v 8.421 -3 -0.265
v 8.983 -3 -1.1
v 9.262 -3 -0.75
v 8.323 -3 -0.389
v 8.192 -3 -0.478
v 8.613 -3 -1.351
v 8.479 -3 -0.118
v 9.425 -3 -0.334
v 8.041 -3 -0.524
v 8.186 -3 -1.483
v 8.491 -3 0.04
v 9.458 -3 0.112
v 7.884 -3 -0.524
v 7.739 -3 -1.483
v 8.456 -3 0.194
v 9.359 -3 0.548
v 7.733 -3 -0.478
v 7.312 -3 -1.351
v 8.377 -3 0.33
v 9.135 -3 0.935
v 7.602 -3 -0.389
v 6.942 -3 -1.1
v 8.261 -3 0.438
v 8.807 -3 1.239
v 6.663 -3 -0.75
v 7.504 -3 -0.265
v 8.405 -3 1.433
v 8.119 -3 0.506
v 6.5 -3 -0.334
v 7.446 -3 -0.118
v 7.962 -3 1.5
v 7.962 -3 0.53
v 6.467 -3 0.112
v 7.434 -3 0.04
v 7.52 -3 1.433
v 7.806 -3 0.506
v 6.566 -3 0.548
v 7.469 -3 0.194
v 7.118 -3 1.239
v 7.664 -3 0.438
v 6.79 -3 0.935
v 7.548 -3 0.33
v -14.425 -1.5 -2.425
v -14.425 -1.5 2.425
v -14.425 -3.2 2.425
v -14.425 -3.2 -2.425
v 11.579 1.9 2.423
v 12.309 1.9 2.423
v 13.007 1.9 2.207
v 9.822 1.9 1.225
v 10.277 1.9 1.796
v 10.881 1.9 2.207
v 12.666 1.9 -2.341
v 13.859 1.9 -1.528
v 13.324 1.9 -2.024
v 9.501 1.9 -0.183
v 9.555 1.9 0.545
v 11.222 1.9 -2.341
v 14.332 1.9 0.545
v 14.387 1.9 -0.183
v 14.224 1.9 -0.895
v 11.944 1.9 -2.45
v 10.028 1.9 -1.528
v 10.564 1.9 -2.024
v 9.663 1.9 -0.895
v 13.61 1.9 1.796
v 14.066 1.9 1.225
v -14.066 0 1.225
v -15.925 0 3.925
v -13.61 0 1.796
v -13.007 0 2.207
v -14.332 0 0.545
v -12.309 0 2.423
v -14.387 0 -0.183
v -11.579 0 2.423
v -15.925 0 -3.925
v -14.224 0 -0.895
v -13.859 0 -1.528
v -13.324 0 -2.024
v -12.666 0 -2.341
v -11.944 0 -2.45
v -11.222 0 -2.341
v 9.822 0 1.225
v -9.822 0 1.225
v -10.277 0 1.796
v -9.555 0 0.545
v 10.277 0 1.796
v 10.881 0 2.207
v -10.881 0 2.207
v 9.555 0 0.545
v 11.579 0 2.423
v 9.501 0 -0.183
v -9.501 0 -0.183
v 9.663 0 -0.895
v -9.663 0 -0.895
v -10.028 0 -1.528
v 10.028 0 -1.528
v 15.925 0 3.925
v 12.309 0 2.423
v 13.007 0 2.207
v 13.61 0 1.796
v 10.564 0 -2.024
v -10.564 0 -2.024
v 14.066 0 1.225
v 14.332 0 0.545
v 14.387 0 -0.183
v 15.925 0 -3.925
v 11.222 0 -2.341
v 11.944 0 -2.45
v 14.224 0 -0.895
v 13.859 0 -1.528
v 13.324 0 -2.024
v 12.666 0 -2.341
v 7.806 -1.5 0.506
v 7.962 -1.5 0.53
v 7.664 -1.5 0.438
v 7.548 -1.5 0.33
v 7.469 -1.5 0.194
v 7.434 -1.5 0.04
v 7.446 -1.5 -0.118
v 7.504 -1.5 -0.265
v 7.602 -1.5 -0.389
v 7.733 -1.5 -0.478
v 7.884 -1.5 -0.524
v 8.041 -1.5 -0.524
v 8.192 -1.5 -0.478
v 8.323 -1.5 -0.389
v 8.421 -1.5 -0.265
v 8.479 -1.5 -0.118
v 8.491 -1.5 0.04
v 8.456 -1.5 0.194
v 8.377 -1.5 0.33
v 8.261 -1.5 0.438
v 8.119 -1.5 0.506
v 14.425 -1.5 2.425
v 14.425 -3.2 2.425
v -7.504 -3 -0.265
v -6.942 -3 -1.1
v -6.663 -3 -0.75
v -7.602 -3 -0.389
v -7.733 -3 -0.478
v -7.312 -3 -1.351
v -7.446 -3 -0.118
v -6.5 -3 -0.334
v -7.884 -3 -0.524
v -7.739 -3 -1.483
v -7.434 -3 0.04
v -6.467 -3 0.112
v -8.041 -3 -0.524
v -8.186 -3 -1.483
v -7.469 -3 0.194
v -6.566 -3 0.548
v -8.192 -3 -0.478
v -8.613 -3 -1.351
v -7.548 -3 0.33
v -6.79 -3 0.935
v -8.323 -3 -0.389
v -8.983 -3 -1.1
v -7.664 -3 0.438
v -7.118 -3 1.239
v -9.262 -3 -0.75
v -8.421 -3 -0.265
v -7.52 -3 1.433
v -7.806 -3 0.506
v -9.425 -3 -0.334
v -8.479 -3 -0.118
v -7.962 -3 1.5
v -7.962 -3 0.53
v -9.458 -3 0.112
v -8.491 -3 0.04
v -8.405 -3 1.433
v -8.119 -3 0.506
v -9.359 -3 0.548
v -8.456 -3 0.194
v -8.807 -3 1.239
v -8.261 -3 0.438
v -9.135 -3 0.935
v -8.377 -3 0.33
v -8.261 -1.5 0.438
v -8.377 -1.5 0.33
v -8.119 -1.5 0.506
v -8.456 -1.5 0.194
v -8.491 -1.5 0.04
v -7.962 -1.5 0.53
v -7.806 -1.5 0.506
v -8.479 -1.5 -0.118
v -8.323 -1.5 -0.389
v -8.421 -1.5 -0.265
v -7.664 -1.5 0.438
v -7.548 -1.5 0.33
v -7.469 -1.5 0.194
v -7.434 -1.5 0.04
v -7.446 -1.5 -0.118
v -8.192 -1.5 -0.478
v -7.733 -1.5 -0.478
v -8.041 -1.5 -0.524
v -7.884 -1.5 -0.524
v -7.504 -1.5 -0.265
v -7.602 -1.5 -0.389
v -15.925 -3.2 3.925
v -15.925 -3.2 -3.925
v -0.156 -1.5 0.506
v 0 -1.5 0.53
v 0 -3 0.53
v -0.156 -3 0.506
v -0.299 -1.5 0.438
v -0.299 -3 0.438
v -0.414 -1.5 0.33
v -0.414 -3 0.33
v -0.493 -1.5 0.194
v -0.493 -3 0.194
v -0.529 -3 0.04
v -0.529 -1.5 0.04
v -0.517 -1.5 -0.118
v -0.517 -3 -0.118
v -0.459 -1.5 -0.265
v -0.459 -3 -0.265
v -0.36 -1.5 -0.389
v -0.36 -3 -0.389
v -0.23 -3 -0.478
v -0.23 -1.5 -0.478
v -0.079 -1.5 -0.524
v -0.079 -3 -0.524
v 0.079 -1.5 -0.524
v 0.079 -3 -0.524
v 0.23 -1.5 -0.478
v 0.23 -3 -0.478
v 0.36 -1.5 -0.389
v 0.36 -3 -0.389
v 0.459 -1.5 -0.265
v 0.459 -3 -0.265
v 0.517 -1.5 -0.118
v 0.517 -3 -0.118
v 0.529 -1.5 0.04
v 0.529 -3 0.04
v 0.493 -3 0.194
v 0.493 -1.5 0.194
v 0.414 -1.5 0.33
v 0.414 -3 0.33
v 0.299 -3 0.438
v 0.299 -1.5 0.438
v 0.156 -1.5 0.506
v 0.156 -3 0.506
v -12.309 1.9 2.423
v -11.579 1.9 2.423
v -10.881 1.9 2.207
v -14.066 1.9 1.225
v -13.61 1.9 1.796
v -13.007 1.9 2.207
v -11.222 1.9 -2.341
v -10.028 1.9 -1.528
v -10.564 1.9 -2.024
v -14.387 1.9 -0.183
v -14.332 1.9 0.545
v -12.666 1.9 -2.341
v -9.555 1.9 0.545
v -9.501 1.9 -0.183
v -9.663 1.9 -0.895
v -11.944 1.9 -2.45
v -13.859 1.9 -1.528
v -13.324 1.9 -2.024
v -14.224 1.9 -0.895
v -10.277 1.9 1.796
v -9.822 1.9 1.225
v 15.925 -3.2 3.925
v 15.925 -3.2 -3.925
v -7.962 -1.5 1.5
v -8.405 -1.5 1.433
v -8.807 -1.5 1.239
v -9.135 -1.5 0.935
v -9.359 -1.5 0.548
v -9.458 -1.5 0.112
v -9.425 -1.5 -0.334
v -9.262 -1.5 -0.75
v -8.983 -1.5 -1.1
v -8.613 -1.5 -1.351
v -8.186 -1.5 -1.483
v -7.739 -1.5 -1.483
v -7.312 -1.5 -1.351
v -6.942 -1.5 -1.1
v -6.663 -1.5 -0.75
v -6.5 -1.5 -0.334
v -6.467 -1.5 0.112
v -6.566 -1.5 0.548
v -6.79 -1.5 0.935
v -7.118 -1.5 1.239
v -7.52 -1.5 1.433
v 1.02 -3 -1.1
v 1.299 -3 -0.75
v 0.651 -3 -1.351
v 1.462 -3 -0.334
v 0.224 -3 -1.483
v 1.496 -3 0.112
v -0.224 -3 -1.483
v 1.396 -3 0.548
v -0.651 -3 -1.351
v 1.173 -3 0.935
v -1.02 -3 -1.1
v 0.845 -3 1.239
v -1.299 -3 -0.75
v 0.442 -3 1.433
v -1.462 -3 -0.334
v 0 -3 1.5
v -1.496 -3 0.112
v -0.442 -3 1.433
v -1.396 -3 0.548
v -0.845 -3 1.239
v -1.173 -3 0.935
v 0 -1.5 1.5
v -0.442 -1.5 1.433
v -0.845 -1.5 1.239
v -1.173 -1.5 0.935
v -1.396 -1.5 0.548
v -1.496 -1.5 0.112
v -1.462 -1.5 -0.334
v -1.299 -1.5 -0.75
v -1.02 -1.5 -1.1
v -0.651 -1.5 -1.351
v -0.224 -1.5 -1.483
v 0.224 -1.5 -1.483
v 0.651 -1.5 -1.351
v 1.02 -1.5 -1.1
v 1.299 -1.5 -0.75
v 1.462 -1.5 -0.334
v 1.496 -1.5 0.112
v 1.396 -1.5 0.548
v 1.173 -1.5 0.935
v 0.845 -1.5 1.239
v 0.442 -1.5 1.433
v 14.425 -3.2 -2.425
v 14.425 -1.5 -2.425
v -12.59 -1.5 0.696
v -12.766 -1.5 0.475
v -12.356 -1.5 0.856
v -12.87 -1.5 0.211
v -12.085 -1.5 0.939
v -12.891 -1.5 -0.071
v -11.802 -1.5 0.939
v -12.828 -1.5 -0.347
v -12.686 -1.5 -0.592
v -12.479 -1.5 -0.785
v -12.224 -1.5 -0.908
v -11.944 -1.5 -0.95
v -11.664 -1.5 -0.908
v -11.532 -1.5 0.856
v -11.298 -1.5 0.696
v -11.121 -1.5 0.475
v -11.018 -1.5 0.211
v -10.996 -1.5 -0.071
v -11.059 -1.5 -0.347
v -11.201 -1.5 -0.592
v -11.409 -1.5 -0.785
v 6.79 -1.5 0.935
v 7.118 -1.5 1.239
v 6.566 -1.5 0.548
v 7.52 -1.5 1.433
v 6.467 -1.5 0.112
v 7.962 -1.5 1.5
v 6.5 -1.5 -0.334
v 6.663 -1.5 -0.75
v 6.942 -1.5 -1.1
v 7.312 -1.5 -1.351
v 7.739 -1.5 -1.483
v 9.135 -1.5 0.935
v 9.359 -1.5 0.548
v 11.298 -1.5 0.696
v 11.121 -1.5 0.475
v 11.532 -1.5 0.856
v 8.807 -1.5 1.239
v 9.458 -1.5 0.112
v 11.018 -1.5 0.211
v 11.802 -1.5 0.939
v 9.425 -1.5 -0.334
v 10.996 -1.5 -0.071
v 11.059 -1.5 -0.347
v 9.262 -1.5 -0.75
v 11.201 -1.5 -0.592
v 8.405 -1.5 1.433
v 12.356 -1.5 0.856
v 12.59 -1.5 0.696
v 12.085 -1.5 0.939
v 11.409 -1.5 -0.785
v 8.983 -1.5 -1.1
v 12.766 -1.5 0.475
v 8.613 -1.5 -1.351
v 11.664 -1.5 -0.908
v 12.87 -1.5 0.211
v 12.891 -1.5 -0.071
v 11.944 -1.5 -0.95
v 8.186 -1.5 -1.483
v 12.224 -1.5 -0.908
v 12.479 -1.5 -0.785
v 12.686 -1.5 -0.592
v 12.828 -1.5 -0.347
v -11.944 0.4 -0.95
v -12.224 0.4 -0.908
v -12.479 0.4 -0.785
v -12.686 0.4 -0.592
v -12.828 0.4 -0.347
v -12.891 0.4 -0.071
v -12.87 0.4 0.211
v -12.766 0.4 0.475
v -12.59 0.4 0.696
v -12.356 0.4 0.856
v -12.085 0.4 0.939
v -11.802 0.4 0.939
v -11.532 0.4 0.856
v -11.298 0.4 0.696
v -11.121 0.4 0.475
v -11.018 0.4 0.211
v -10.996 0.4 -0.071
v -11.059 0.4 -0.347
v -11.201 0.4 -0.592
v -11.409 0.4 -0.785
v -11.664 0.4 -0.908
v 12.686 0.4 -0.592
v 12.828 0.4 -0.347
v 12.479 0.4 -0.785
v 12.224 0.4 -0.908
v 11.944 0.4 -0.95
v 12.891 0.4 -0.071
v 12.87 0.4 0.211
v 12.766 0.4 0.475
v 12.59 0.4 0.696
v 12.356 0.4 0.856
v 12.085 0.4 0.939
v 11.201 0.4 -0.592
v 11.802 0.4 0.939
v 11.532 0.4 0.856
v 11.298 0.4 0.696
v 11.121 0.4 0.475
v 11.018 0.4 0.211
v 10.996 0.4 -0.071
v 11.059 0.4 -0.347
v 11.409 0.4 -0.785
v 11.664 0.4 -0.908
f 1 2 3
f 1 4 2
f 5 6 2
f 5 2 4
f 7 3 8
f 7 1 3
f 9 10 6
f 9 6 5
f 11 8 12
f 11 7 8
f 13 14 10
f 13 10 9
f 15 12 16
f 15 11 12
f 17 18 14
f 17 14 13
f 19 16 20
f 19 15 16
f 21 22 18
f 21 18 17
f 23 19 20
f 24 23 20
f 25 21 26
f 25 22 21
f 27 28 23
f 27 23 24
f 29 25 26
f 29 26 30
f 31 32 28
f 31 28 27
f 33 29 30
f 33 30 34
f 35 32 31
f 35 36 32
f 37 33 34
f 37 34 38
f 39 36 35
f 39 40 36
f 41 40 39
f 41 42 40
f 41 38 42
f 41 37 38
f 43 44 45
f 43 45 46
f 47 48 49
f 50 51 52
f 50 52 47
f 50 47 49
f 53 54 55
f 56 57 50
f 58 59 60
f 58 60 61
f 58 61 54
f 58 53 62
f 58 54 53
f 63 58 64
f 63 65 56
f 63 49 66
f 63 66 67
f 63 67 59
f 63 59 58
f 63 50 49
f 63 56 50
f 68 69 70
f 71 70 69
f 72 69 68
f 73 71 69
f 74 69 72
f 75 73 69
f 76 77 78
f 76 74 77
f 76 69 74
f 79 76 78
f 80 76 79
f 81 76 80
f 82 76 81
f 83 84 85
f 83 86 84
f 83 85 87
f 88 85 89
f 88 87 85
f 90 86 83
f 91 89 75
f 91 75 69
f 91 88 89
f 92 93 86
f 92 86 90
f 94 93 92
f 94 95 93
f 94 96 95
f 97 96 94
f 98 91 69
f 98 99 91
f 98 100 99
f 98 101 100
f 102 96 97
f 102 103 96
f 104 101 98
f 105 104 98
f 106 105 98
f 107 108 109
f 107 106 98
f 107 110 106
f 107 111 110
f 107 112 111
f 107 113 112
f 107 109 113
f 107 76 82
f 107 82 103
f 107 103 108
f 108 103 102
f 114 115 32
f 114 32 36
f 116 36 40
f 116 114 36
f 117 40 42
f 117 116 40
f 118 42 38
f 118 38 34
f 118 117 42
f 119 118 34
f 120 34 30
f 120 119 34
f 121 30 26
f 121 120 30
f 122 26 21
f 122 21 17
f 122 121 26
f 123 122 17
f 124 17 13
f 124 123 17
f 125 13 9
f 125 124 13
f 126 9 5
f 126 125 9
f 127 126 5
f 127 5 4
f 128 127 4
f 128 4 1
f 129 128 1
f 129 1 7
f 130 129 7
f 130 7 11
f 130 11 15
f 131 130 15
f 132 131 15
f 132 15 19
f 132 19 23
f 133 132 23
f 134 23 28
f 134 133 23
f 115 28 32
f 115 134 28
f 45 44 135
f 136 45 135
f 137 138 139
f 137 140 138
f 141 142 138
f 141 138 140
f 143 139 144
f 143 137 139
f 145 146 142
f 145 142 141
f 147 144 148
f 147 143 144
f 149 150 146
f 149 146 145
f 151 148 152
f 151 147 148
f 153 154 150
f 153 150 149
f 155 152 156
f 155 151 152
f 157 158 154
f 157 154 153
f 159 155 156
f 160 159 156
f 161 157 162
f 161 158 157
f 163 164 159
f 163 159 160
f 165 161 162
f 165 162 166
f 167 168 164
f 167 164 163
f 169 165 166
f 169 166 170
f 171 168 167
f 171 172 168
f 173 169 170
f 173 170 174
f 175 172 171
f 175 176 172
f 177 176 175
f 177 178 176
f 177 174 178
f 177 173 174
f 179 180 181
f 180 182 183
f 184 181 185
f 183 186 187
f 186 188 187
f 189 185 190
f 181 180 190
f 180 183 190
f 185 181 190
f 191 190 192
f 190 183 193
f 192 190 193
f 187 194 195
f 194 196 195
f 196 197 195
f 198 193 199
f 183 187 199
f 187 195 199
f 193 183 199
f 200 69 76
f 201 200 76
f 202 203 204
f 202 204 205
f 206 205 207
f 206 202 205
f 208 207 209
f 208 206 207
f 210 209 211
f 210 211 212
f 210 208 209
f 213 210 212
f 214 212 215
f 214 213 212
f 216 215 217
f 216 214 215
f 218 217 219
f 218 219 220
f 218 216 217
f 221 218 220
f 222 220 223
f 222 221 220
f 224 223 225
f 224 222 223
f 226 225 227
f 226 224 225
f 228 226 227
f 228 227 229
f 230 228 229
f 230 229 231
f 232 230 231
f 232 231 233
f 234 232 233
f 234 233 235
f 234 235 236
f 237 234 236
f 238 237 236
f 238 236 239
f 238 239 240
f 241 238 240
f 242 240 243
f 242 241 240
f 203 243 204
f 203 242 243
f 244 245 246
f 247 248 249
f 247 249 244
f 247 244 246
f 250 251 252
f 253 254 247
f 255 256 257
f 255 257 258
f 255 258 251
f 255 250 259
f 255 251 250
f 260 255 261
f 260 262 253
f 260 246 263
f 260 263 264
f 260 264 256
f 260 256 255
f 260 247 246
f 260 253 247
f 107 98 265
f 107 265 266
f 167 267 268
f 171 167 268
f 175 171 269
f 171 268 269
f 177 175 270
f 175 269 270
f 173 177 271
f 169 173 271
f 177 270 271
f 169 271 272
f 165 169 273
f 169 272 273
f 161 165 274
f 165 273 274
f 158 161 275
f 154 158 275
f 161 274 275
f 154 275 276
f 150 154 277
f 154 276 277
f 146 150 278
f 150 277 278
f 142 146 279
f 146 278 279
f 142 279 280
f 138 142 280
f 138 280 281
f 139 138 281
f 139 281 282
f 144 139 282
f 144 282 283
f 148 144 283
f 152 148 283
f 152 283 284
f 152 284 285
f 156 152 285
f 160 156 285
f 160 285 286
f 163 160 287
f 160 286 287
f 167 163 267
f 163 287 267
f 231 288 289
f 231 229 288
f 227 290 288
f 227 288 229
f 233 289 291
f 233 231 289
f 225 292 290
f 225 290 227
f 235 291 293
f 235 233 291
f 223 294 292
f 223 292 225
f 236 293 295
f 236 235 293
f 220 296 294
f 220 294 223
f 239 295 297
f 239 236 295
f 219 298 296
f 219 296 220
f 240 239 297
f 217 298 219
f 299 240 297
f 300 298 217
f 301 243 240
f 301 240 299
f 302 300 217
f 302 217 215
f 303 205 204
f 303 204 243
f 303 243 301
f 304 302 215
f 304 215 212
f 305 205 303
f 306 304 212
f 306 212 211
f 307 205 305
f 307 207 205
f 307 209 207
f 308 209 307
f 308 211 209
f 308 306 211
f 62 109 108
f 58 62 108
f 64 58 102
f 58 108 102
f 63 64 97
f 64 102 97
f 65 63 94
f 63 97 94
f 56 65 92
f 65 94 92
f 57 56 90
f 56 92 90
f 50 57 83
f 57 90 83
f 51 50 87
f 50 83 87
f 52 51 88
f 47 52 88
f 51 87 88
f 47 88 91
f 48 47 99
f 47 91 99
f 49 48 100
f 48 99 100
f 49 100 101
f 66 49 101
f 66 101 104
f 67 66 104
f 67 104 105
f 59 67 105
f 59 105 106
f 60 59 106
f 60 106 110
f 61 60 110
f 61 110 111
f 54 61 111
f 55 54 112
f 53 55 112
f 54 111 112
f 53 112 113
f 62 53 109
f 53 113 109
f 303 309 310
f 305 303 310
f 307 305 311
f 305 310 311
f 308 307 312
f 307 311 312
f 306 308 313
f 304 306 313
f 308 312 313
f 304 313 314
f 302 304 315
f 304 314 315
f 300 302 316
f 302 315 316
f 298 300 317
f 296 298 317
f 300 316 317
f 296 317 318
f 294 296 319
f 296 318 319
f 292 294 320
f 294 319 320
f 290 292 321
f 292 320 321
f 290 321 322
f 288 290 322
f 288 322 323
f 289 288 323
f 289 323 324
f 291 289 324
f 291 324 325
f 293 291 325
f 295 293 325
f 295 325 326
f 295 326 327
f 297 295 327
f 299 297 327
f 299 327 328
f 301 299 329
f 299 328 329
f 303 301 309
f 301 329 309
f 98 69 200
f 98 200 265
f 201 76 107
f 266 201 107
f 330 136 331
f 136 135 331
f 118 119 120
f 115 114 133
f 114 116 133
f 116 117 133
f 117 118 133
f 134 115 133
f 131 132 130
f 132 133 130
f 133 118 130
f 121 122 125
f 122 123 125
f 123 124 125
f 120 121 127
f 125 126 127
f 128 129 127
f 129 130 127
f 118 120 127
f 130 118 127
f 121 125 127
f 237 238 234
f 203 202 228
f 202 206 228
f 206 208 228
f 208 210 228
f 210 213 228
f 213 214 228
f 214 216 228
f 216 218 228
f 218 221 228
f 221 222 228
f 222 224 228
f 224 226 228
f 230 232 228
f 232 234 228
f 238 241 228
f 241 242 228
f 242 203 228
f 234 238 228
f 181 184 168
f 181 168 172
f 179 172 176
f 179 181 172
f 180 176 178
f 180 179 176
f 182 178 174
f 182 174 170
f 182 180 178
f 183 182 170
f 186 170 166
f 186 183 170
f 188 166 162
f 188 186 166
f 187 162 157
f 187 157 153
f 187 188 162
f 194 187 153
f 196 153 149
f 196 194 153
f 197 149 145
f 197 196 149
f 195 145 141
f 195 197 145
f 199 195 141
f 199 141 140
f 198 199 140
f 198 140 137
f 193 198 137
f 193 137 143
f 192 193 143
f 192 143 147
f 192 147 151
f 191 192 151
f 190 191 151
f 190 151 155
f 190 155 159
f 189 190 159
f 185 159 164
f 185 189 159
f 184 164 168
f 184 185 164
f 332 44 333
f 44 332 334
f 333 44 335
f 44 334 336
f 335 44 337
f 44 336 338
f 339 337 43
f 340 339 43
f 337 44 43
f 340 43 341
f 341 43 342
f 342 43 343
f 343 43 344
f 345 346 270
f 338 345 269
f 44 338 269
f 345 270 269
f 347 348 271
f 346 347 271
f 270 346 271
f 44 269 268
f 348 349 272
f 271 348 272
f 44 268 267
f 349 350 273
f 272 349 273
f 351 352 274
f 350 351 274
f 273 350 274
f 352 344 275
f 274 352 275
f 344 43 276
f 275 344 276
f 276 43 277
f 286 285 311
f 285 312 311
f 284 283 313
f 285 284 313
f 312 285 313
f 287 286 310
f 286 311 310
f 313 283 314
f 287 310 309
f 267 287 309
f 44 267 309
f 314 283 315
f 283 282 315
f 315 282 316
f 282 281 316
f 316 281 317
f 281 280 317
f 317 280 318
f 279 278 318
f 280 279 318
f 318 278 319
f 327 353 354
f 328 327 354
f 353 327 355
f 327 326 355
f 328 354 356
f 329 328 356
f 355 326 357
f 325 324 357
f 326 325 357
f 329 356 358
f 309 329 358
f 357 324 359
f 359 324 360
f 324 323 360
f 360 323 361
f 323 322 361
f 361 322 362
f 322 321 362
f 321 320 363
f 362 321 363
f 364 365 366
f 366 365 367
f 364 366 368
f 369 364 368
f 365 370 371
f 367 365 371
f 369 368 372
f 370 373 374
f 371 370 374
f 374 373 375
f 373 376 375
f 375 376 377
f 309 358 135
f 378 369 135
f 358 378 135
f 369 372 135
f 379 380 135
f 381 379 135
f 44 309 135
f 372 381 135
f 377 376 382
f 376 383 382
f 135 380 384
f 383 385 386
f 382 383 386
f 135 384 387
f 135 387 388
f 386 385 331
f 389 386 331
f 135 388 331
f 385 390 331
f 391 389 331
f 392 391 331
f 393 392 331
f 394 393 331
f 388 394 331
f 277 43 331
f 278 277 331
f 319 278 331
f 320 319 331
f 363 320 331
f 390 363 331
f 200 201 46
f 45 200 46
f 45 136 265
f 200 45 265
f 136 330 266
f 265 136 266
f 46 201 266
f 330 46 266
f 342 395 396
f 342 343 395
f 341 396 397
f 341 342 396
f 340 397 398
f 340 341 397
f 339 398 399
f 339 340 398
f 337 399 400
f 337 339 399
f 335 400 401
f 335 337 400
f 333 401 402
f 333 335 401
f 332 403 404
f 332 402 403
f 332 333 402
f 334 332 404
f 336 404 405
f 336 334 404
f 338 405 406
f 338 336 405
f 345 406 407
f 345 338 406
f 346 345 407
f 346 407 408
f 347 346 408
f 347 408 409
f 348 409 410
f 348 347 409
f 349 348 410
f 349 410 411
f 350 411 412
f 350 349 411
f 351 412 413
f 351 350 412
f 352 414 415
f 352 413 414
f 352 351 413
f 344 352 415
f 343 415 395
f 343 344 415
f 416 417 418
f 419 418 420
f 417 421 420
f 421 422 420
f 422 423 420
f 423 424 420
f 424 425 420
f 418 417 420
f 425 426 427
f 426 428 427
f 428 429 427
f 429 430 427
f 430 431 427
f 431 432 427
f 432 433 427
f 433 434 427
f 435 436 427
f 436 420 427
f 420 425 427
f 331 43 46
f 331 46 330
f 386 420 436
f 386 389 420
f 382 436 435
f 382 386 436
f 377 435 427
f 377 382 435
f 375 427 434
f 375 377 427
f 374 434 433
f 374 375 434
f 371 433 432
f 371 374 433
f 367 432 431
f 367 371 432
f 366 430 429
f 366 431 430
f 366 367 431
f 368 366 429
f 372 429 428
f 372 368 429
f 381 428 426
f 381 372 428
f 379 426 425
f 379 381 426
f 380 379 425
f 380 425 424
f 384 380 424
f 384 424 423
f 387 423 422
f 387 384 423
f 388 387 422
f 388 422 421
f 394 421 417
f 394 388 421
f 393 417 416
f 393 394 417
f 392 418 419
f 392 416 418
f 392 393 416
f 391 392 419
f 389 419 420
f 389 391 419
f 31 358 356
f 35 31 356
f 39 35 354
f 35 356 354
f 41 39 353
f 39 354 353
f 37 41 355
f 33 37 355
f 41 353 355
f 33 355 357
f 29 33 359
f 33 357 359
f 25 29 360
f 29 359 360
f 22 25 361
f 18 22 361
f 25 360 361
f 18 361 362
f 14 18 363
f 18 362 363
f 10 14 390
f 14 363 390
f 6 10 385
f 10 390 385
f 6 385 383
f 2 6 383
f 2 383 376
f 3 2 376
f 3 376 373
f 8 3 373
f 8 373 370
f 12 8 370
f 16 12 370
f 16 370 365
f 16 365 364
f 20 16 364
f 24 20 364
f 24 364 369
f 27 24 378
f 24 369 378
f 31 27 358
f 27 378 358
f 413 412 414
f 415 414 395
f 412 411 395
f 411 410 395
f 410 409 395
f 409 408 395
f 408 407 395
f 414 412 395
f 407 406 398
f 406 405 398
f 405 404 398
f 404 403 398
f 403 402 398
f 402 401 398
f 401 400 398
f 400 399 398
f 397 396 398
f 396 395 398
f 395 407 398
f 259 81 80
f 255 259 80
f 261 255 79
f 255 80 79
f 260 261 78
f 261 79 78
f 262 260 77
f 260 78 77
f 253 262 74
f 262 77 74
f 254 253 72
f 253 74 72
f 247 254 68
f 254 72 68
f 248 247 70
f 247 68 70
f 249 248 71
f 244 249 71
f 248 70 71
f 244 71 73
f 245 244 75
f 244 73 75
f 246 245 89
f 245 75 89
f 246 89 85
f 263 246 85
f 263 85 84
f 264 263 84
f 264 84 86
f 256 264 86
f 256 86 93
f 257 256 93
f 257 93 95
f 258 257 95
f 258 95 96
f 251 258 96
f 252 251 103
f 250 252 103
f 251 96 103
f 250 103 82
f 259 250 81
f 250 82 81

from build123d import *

# Parameters (mm, degrees)
SKETCH1_W           = 31.85
SKETCH1_H           = 7.85
BOSS_EXTRUDE1_DEPTH = 3.2
SKETCH2_R           = 2.45
BOSS_EXTRUDE2_DEPTH = 1.9
SHELL1_T            = -1.5
SKETCH3_R           = 1.5
SKETCH3_R_2         = 0.53
BOSS_EXTRUDE3_DEPTH = 1.5


with BuildPart() as part:
    # Sketch1 → Boss-Extrude1 (new body)
    with BuildSketch(Plane(origin=(0, 0, 0), x_dir=(1, 0, 0), z_dir=(0, 1, 0))):
        Rectangle(SKETCH1_W, SKETCH1_H)
    extrude(amount=-BOSS_EXTRUDE1_DEPTH)

    # Sketch2 → Boss-Extrude2 (add)
    with BuildSketch(Plane(origin=(0, 0, 0), x_dir=(1, 0, 0), z_dir=(0, 1, 0))):
        with Locations(Location((11.94375, 0, 0), (0, 0, 90))):
            Circle(SKETCH2_R)
        with Locations(Location((-11.94375, 0, 0), (0, 0, 90))):
            Circle(SKETCH2_R)
    extrude(amount=BOSS_EXTRUDE2_DEPTH)

    # Shell1
    shell1_openings = [part.faces().sort_by_distance(p)[0] for p in [
        (0, -3.2, 0),
    ]]
    offset(amount=SHELL1_T, openings=shell1_openings, kind=Kind.INTERSECTION)

    # Sketch3 → Boss-Extrude3 (add)
    # profile 1 of 3: a face of its own
    with BuildSketch(Plane.XZ.offset(1.5)):
        with Locations(Location((-7.9625, 0, 0), (0, 0, 90))):
            Circle(SKETCH3_R)
        with Locations(Location((-7.9625, 0, 0), (0, 0, 90))):
            Circle(SKETCH3_R_2, mode=Mode.SUBTRACT)
    # profile 2 of 3: a face of its own
    with BuildSketch(Plane.XZ.offset(1.5)):
        with Locations(Location((0, 0, 0), (0, 0, 90))):
            Circle(SKETCH3_R)
        with Locations(Location((0, 0, 0), (0, 0, 90))):
            Circle(SKETCH3_R_2, mode=Mode.SUBTRACT)
    # profile 3 of 3: a face of its own
    with BuildSketch(Plane.XZ.offset(1.5)):
        with Locations(Location((7.9625, 0, 0), (0, 0, 90))):
            Circle(SKETCH3_R)
        with Locations(Location((7.9625, 0, 0), (0, 0, 90))):
            Circle(SKETCH3_R_2, mode=Mode.SUBTRACT)
    extrude(amount=BOSS_EXTRUDE3_DEPTH)


solid = part.part
